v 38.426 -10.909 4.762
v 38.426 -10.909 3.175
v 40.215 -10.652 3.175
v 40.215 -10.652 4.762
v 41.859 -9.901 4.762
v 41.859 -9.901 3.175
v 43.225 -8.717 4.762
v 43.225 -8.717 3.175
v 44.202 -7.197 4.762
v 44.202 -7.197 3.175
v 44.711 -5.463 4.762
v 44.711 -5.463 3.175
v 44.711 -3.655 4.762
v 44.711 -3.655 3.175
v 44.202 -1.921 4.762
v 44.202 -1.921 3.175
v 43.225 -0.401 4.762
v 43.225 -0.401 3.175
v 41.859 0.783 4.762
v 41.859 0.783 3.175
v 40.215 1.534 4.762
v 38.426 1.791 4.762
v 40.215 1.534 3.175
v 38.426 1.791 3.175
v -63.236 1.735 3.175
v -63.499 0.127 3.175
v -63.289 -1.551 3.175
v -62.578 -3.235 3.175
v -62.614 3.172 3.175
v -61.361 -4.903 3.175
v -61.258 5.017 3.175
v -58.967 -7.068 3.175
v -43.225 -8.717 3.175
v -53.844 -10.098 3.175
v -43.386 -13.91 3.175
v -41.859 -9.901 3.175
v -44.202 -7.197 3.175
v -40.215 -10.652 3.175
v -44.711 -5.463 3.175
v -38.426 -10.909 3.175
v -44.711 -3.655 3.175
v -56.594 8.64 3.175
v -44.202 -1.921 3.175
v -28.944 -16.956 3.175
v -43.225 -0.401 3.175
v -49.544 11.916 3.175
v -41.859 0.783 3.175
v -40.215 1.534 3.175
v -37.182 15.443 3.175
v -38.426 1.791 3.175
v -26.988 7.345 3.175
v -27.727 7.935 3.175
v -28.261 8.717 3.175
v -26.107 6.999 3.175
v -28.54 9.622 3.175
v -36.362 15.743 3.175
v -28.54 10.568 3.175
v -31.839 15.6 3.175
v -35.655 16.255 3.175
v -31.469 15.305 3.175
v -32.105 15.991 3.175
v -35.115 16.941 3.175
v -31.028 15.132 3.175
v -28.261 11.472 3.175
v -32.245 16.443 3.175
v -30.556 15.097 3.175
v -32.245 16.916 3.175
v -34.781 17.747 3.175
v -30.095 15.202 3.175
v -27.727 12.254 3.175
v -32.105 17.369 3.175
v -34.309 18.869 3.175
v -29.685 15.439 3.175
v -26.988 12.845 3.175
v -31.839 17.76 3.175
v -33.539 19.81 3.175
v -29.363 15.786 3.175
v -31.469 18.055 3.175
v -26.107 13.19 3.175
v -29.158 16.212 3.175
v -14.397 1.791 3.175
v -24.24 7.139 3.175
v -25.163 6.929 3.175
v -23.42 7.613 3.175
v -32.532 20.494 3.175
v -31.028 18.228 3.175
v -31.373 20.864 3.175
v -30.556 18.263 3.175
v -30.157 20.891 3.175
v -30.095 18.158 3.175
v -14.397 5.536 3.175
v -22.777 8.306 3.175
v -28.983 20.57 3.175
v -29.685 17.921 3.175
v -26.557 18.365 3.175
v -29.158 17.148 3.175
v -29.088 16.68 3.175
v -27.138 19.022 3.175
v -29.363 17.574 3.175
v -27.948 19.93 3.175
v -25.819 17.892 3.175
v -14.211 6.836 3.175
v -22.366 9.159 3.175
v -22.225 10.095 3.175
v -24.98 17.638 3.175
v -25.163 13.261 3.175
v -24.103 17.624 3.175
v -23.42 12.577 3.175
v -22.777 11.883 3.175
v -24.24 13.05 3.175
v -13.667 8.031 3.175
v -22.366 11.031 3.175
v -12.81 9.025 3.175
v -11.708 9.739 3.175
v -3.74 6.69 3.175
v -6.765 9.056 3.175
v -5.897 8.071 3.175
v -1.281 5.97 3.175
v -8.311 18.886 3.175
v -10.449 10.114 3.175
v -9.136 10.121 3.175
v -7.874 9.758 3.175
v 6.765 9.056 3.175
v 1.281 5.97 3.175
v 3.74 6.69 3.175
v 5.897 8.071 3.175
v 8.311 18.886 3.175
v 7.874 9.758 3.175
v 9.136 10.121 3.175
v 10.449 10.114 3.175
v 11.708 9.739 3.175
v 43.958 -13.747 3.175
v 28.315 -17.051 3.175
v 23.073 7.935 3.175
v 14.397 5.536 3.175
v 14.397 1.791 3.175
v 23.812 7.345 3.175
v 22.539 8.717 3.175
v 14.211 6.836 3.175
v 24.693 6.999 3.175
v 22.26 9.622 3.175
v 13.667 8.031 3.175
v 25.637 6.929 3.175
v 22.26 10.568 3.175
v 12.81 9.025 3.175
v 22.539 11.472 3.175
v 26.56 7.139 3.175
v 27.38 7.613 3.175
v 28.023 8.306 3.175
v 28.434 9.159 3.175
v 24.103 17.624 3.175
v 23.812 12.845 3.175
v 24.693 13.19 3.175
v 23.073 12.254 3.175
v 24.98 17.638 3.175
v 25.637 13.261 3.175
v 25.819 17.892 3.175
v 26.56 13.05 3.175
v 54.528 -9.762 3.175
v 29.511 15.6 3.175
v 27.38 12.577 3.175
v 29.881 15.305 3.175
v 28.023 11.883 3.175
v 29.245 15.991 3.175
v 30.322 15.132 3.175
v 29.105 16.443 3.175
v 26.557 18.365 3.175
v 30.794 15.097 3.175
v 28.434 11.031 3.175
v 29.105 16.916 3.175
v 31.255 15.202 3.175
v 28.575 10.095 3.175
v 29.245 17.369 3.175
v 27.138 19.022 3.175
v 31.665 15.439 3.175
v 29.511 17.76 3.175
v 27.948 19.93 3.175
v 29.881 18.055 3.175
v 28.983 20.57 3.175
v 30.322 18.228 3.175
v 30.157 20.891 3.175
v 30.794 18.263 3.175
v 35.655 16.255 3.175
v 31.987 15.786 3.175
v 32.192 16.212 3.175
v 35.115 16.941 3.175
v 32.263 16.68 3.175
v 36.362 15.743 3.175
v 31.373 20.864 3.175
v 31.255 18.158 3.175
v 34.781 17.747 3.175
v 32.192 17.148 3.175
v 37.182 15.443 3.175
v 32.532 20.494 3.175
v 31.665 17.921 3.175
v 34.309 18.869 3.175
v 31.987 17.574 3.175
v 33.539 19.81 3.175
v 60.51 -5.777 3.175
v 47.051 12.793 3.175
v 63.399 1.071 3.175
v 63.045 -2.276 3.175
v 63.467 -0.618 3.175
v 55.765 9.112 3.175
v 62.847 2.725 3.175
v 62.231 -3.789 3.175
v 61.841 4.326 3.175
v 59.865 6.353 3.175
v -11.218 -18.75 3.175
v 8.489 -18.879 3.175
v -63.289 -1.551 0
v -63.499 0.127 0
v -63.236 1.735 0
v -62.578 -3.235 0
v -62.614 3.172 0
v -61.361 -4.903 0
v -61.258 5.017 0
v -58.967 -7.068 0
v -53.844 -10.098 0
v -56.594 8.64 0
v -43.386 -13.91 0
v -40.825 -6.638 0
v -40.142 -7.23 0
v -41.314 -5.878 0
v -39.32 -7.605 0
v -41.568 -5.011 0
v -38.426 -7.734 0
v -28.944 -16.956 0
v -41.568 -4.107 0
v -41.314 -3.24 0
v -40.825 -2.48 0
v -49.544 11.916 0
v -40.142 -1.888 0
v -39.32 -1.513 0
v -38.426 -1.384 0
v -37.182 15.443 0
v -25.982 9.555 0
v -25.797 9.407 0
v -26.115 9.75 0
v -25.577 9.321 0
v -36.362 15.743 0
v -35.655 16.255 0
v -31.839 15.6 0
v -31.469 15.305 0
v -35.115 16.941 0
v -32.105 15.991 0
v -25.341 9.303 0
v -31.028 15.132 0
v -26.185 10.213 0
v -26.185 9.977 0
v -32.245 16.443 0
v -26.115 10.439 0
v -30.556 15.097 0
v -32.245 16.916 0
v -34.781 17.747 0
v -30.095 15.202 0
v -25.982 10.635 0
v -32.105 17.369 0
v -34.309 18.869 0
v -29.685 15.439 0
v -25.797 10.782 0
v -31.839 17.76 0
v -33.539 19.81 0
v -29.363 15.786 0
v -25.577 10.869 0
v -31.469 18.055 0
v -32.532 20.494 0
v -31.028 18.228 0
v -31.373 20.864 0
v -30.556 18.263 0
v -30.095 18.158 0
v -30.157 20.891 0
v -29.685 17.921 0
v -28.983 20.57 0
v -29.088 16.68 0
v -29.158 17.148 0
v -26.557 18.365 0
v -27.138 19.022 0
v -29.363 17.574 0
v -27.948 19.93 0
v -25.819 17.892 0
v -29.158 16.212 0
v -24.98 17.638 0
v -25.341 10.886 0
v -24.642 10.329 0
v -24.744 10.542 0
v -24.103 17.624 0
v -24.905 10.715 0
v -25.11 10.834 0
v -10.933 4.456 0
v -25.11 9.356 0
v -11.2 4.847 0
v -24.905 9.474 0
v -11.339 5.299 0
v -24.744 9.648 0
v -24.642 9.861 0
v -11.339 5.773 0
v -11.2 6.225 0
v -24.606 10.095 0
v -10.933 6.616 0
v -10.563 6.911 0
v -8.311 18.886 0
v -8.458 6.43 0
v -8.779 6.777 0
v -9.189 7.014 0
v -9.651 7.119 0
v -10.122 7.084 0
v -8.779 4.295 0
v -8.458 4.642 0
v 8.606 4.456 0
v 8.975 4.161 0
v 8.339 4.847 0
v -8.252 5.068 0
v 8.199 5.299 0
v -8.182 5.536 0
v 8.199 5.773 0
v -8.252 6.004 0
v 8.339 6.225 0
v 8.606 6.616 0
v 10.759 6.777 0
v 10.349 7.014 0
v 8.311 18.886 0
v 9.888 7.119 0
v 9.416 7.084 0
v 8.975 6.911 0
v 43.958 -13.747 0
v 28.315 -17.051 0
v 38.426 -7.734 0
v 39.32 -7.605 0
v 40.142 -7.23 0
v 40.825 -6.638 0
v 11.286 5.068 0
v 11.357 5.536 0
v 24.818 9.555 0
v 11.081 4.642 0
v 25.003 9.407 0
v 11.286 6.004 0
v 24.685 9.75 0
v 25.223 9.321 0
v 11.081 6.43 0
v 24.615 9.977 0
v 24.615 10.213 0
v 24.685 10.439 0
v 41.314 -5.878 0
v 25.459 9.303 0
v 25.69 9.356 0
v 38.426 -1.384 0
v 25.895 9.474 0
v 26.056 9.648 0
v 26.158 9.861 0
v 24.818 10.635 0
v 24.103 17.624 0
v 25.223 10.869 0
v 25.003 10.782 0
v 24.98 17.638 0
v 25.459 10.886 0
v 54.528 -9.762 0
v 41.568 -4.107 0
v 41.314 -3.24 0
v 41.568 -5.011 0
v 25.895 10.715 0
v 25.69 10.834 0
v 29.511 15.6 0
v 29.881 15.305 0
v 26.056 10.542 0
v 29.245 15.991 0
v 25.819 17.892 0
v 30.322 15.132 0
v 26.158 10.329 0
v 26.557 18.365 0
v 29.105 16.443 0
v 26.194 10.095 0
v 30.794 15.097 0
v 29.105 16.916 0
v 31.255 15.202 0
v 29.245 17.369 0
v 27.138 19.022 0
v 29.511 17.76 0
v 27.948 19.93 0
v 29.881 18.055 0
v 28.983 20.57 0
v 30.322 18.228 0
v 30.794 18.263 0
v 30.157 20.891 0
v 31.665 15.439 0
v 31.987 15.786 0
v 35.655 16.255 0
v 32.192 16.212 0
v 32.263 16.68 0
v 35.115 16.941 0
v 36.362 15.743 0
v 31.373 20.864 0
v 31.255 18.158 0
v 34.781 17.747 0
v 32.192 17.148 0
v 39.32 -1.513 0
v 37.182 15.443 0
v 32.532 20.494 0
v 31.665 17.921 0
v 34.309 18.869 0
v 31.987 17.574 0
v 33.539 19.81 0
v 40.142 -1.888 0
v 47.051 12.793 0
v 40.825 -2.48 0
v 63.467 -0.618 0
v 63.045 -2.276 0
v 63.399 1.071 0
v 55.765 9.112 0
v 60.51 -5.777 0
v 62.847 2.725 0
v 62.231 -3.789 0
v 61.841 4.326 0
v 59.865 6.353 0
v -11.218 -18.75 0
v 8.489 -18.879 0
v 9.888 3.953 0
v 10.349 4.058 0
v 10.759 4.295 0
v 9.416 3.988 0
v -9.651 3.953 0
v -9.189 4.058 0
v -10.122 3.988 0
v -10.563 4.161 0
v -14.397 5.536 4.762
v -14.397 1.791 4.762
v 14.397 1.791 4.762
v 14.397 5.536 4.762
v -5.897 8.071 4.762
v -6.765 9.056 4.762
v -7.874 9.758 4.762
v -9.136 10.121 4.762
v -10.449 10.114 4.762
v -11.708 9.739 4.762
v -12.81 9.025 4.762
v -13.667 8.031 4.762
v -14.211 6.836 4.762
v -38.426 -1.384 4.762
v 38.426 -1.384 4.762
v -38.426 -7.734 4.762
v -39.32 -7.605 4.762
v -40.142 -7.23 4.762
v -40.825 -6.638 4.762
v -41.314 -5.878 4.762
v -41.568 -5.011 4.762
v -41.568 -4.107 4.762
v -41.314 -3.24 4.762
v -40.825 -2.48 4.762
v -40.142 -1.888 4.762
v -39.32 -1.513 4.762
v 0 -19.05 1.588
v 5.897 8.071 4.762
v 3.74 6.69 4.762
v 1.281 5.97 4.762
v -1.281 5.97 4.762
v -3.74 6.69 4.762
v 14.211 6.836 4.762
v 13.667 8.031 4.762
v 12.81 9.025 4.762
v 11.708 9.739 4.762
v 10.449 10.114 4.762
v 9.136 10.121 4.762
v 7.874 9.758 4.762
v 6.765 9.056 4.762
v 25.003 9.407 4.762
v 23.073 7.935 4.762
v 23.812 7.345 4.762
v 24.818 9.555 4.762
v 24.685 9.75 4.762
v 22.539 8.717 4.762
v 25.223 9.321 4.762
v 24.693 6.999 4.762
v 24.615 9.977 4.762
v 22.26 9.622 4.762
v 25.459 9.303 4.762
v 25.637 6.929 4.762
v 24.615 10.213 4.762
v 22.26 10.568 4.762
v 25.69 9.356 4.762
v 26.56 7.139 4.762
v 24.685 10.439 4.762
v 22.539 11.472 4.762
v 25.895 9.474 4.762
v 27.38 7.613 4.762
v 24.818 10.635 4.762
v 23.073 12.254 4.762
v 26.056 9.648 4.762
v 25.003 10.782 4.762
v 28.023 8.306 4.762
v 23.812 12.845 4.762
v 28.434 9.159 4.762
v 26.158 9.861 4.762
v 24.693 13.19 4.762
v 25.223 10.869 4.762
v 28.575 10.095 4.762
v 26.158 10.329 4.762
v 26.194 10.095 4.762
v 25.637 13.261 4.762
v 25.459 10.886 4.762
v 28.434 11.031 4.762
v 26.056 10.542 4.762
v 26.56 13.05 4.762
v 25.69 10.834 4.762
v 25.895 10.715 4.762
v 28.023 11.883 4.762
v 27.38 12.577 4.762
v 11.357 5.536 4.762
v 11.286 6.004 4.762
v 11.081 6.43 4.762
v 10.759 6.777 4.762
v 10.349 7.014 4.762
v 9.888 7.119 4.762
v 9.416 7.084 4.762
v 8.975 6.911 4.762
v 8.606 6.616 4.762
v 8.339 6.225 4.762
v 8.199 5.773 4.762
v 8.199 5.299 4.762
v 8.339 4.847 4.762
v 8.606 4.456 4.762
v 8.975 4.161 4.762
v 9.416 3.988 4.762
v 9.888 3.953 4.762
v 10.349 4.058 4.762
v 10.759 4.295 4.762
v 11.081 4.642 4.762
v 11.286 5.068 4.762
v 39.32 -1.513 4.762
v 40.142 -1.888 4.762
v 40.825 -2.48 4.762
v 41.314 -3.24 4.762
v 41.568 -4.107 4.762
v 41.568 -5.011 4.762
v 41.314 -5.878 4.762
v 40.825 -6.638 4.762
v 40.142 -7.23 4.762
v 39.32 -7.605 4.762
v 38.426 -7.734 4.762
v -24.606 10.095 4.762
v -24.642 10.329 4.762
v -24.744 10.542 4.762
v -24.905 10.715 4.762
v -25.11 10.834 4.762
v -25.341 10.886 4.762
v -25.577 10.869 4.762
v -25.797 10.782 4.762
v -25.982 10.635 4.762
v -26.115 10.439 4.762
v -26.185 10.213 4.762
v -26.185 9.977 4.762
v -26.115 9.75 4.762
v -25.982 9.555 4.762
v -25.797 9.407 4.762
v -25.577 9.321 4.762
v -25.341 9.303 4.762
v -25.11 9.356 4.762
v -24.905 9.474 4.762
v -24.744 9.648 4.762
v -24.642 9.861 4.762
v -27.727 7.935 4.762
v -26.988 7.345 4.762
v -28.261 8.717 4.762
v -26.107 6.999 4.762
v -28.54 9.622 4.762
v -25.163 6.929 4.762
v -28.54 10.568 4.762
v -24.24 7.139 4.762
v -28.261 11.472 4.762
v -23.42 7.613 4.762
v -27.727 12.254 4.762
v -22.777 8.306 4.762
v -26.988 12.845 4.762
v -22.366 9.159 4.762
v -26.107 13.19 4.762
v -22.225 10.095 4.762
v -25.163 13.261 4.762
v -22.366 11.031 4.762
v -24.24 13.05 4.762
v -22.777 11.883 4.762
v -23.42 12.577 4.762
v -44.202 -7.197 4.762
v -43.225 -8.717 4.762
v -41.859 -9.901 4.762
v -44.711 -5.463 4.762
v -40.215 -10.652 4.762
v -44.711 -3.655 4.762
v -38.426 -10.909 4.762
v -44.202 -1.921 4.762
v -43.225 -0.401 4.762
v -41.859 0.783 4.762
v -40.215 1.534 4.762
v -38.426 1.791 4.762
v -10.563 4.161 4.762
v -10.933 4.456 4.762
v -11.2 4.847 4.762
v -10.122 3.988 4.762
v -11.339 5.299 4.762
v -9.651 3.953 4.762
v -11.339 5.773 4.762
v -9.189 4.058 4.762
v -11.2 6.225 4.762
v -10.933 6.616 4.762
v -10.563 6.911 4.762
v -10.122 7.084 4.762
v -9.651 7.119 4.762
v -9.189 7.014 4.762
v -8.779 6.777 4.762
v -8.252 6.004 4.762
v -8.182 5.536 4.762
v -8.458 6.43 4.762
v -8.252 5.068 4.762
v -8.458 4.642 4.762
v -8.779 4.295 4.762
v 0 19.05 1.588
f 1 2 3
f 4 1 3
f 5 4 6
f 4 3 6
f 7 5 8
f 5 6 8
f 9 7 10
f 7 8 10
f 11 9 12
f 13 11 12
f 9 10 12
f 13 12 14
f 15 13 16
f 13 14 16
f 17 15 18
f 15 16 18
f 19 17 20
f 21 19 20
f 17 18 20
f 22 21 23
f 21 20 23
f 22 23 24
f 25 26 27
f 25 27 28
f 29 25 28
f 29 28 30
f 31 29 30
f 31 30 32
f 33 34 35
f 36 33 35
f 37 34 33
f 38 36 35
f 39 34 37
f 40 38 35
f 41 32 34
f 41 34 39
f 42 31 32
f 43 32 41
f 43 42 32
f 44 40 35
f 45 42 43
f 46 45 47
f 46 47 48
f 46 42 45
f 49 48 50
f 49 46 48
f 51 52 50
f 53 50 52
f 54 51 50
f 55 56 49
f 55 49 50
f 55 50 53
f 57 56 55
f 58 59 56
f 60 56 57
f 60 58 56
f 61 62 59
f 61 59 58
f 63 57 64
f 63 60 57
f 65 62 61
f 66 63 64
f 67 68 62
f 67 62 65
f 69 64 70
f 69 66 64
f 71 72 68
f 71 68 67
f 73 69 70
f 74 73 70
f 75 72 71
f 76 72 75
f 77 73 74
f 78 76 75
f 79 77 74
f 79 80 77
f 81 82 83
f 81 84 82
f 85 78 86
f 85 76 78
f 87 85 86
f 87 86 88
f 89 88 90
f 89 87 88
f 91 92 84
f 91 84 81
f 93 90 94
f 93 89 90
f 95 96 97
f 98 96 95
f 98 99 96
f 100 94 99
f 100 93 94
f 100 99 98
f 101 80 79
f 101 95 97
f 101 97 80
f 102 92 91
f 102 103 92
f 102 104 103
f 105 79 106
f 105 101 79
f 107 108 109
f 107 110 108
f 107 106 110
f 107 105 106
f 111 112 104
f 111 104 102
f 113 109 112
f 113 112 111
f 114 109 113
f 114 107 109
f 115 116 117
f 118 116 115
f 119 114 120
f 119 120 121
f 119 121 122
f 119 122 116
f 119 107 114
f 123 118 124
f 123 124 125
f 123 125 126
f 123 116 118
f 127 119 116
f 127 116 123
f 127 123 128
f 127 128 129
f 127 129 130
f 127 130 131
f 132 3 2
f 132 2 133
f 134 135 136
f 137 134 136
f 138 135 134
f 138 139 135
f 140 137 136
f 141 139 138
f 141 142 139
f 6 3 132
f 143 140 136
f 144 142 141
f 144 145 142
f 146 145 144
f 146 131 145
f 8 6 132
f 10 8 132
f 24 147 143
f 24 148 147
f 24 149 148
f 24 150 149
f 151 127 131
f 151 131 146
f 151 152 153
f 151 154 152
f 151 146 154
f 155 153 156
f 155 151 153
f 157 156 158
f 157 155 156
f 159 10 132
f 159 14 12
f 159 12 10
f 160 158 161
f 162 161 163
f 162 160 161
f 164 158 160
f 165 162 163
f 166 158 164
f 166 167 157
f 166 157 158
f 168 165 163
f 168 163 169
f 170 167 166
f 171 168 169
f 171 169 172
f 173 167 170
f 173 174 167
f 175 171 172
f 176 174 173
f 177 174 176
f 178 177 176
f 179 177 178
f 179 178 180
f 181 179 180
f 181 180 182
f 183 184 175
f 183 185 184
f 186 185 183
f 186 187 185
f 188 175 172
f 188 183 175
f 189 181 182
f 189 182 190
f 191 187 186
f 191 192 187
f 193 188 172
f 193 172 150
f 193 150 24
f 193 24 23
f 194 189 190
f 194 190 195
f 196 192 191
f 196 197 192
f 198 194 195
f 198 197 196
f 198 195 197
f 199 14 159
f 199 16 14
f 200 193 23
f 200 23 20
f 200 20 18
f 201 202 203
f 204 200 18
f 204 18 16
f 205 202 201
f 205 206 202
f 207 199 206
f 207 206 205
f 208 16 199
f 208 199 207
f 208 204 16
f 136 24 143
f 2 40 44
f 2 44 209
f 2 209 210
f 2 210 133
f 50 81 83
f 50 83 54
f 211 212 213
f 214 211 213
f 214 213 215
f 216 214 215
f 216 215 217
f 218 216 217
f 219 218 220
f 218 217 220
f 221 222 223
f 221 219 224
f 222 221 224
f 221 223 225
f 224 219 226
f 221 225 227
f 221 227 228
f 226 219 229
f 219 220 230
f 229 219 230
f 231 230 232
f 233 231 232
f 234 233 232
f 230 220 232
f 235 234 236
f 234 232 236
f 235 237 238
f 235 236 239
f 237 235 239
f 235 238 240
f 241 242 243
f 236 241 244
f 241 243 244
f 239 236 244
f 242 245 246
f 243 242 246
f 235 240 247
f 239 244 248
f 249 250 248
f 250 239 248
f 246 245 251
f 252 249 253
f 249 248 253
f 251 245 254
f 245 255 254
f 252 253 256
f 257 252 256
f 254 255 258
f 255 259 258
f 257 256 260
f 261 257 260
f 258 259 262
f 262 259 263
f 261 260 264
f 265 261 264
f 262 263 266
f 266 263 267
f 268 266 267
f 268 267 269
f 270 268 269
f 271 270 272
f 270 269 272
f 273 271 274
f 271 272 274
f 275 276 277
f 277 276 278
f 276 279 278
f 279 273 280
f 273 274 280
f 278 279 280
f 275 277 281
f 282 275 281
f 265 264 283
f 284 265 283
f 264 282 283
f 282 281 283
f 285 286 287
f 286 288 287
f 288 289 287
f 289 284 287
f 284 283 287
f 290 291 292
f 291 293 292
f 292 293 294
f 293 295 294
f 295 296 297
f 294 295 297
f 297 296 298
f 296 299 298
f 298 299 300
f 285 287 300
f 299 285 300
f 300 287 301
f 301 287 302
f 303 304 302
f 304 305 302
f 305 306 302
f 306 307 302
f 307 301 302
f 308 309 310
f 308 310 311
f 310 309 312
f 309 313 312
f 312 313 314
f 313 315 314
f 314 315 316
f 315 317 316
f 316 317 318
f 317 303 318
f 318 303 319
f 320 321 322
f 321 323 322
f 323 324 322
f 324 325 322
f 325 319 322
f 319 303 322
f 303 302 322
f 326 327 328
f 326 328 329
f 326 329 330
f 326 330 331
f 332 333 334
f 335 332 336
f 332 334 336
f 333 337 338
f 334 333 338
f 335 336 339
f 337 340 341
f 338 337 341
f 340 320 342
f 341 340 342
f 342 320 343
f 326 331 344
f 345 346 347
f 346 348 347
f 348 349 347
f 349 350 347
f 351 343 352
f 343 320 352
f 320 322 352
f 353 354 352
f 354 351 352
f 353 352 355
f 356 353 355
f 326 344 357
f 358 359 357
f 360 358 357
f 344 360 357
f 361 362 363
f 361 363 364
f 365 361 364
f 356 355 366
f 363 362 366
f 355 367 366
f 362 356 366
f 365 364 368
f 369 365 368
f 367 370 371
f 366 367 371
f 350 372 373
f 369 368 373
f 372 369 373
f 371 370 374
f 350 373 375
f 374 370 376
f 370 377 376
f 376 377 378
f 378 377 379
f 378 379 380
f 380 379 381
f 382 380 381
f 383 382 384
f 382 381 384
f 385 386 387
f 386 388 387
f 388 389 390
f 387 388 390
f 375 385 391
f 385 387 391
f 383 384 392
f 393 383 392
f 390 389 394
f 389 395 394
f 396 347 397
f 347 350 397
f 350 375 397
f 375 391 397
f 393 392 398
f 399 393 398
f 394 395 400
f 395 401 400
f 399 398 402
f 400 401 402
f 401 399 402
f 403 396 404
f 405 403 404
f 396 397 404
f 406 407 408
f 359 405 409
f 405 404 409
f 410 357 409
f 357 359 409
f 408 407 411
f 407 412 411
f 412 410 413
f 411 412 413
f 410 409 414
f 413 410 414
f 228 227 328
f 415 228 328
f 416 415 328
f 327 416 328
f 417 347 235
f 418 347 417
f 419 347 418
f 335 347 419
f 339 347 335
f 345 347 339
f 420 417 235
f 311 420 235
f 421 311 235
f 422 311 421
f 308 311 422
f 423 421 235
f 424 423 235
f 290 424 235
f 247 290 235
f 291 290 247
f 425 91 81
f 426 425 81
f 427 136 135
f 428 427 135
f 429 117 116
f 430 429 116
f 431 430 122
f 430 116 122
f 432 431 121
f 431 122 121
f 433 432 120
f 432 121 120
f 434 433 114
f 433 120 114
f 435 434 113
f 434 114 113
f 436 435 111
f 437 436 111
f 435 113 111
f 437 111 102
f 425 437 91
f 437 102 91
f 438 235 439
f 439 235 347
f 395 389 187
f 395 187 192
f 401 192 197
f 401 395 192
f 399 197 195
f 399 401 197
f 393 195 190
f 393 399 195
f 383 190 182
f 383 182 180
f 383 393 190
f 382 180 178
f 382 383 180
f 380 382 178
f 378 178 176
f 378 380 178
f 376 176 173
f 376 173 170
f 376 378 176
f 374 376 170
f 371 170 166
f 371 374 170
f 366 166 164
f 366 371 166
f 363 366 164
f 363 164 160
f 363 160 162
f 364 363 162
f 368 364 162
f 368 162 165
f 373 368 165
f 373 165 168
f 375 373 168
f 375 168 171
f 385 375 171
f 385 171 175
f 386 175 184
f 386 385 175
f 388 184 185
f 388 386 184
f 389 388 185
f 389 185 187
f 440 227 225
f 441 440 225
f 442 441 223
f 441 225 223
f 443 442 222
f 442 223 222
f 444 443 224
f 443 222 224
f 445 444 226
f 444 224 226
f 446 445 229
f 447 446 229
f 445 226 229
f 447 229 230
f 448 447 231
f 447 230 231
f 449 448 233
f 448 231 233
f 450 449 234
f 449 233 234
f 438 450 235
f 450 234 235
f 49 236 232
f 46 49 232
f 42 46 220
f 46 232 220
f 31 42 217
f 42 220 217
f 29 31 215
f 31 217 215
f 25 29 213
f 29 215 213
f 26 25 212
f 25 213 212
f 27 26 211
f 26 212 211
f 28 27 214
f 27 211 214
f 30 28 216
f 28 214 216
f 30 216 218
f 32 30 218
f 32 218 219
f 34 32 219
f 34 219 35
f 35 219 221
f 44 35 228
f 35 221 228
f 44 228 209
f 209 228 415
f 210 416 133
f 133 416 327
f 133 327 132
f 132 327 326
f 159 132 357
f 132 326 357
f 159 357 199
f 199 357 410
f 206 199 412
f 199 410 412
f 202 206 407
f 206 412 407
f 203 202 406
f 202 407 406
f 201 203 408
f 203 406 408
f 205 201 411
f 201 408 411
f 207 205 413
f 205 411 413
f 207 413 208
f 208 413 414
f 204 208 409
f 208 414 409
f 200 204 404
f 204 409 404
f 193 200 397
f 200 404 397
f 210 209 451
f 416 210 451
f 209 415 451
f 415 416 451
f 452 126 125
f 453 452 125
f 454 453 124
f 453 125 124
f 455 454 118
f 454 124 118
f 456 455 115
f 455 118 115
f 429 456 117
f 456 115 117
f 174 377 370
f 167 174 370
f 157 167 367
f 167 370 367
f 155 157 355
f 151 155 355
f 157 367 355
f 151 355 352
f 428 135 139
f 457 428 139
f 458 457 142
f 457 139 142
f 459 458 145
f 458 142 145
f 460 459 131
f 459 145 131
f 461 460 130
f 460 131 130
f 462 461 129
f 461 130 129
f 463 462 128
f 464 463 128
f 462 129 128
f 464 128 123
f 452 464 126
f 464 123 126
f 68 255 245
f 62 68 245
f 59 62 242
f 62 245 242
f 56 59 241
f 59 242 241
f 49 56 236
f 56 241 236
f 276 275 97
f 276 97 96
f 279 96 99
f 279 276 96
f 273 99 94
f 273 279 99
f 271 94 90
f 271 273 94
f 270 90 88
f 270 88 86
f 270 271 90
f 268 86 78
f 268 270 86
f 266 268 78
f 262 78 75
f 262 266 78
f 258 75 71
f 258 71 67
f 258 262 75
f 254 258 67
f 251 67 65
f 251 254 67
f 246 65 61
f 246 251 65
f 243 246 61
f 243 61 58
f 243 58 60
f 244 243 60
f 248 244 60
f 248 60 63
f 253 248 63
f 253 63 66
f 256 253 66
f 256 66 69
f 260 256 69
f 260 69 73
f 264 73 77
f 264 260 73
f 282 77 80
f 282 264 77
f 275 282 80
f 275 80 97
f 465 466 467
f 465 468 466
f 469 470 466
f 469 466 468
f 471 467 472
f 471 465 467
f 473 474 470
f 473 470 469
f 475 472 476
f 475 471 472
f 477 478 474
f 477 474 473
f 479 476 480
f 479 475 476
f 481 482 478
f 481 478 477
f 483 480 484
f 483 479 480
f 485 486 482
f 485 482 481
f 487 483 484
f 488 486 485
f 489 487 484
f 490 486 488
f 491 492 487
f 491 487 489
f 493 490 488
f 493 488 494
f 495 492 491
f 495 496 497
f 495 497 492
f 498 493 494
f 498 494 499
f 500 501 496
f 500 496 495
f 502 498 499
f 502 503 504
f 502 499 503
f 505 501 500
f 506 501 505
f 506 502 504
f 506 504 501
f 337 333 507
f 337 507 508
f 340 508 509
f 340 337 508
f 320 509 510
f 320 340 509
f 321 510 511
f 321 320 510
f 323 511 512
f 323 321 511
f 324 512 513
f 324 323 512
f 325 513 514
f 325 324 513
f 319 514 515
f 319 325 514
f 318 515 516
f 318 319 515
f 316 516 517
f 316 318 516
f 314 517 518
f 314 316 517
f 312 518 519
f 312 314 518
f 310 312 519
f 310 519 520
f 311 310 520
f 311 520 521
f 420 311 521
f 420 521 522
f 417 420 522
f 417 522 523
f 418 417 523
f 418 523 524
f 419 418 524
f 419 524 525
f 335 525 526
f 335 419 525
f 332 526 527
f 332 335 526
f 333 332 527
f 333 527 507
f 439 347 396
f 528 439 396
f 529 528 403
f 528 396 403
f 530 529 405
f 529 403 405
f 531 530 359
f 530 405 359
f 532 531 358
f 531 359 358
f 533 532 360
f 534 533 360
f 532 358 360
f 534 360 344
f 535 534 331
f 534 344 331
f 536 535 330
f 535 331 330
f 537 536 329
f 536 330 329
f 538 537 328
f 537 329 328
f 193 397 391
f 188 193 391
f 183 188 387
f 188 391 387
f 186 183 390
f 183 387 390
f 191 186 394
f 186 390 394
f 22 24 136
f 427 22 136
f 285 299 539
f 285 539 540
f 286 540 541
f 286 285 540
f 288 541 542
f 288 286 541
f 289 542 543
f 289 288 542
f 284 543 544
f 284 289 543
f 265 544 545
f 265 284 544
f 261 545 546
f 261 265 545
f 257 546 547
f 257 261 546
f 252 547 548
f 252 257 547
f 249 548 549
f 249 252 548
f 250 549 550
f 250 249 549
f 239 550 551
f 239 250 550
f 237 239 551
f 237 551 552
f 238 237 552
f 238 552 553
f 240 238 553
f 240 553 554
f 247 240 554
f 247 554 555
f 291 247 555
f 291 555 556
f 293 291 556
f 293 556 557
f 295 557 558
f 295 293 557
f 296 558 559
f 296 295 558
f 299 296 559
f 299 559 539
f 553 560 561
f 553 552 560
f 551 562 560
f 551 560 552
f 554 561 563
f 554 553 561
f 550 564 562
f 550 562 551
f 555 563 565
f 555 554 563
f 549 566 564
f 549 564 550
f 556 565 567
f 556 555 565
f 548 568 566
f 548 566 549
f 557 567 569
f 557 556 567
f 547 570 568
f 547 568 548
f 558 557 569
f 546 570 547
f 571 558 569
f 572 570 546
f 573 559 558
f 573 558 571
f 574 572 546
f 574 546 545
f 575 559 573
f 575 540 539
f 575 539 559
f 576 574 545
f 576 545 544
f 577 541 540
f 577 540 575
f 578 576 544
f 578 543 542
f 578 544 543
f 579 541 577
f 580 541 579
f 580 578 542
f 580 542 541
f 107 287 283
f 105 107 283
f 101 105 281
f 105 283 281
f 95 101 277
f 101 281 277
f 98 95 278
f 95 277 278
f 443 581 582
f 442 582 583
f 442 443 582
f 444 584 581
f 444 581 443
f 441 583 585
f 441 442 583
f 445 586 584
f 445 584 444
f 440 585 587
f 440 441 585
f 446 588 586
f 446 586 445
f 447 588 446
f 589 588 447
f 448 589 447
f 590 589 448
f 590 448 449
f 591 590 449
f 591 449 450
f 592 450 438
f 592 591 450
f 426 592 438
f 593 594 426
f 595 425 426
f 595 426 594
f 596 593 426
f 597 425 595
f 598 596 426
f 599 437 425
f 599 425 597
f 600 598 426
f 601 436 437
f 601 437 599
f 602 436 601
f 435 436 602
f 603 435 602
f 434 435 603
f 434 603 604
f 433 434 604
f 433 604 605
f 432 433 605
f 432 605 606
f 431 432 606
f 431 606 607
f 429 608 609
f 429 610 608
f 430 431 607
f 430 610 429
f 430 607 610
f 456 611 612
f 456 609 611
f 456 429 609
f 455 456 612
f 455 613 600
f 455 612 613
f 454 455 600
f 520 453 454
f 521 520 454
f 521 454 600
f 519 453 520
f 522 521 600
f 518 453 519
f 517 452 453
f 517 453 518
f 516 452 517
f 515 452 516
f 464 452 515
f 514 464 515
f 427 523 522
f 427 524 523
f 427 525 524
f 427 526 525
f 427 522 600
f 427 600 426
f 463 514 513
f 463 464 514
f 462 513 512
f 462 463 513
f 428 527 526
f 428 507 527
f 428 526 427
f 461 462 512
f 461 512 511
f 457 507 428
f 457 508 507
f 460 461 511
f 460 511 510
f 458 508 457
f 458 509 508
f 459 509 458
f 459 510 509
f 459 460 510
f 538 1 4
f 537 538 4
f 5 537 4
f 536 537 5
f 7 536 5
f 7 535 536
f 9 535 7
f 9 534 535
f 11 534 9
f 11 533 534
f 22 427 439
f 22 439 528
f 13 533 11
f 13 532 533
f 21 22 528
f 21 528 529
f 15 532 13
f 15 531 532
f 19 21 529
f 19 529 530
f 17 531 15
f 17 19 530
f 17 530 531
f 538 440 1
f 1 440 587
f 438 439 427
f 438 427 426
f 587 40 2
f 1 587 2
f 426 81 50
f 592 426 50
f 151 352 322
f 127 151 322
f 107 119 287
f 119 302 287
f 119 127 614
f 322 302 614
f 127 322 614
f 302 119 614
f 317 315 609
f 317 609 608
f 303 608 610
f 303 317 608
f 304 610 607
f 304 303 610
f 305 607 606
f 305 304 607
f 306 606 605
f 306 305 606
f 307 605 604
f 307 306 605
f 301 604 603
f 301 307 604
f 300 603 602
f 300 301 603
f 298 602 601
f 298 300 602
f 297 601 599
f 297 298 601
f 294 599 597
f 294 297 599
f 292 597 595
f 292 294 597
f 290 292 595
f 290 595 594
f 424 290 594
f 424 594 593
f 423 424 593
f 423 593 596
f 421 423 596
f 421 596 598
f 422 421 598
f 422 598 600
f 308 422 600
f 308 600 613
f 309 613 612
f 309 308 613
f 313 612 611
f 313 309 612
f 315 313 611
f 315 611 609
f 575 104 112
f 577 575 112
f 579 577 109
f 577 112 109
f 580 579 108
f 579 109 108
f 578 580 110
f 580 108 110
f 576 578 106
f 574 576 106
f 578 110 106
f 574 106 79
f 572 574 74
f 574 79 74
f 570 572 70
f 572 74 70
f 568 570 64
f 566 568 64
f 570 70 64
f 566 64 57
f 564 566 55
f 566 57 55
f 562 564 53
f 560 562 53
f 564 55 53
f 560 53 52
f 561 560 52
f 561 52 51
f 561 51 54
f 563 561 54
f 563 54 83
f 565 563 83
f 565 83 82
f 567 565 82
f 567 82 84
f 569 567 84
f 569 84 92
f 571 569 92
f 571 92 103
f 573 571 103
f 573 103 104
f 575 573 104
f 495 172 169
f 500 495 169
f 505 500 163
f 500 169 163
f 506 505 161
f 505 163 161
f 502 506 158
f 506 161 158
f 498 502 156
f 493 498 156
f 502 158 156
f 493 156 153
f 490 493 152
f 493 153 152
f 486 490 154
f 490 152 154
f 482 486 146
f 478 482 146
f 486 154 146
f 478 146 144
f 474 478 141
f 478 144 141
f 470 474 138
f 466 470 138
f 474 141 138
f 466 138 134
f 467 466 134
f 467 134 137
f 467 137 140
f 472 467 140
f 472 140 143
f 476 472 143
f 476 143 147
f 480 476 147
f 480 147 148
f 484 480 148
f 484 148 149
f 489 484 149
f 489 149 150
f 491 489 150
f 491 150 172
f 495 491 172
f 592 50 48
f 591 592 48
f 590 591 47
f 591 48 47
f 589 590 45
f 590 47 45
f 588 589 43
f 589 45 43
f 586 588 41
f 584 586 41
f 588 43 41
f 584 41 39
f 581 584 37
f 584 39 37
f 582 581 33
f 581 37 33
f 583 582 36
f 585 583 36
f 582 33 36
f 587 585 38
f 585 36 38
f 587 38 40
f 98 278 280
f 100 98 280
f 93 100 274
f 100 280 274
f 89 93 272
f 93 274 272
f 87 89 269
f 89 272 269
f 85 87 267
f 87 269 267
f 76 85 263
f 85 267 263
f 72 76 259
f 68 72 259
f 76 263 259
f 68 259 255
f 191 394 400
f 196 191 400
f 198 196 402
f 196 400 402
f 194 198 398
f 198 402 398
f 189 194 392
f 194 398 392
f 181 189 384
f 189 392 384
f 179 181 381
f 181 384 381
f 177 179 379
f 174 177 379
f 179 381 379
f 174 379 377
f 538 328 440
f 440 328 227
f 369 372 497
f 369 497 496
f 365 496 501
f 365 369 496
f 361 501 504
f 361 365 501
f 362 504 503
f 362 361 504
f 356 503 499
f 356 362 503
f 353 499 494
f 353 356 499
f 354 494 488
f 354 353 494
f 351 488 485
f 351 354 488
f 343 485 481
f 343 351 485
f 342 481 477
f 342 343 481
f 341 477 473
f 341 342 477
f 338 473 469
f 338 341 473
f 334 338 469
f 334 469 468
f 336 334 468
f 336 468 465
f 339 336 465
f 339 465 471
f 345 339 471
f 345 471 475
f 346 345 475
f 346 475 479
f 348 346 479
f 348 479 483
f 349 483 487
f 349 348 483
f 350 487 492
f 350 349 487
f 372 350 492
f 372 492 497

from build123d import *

# Parameters (mm, degrees)
F0_R     = 1.5875
F1_DEPTH = 4.7625
F0_R_2   = 3.175
F2_DEPTH = 3.175
F0_R_3   = 0.79375
F3_DEPTH = 4.7625


with BuildPart() as f1:
    # F0 (on Top) → F1 (new body)
    with BuildSketch(Plane.XY):
        with BuildLine():
            ThreePointArc((5.8970375136, 8.0709776401), (0, 5.8784868319), (-5.8970375136, 8.0709776401))
            ThreePointArc((-5.8970375136, 8.0709776401), (-11.0919363971, 9.9710945203), (-14.3974584471, 5.5359008893))
            Line((-14.3974584471, 5.5359008893), (-14.3974584471, 1.7910238821))
            Line((-14.3974584471, 1.7910238821), (-38.4256446949, 1.7910238821))
            ThreePointArc((-38.4256446949, 1.7910238821), (-44.775644668, -4.558976091), (-38.4256446949, -10.9089760641))
            Line((-38.4256446949, -10.9089760641), (38.4256446949, -10.9089760641))
            ThreePointArc((38.4256446949, -10.9089760641), (44.775644668, -4.558976091), (38.4256446949, 1.7910238821))
            Line((38.4256446949, 1.7910238821), (14.3974584471, 1.7910238821))
            Line((14.3974584471, 1.7910238821), (14.3974584471, 5.5359008893))
            ThreePointArc((14.3974584471, 5.5359008893), (11.0919363971, 9.9710945203), (5.8970375136, 8.0709776401))
        make_face()
        with BuildLine():
            ThreePointArc((-38.4256446949, -7.7339760641), (-41.6006446949, -4.5589760641), (-38.4256446949, -1.3839760641))
            Line((-38.4256446949, -1.3839760641), (38.4256446949, -1.3839760641))
            ThreePointArc((38.4256446949, -1.3839760641), (41.6006446949, -4.5589760641), (38.4256446949, -7.7339760641))
            Line((38.4256446949, -7.7339760641), (-38.4256446949, -7.7339760641))
        make_face(mode=Mode.SUBTRACT)
        with Locations((-9.769230575, 5.5359008893)):
            Circle(F0_R, mode=Mode.SUBTRACT)
        with Locations((9.769230575, 5.5359008893)):
            Circle(F0_R, mode=Mode.SUBTRACT)
    extrude(amount=F1_DEPTH)

    # F0 (on Top) → F2 (join)
    with BuildSketch(Plane.XY):
        with BuildLine():
            ThreePointArc((-24.1030436331, 17.6243126358), (-25.8193200805, 17.891793653), (-27.1380004421, 19.0223833409))
            ThreePointArc((-27.1380004421, 19.0223833409), (-31.3733022659, 20.8644178844), (-34.7810874927, 17.7470676241))
            ThreePointArc((-34.7810874927, 17.7470676241), (-35.6552985282, 16.2552803111), (-37.1815865182, 15.4428030538))
            add(Edge.make_bspline(
                [(-37.1815865182, 15.4428030538), (-196.360008544, -19.05), (0, -19.05), (196.360008544, -19.05), (37.1815865182, 15.4428030538)],
                knots=[5.3379310625, 5.3379310625, 5.3379310625, 7.853981634, 7.853981634, 10.3700322054, 10.3700322054, 10.3700322054], degree=2, weights=[1, 0.3076964173, 1, 0.3076964173, 1]))
            ThreePointArc((37.1815865182, 15.4428030538), (35.6552985282, 16.2552803111), (34.7810874927, 17.7470676241))
            ThreePointArc((34.7810874927, 17.7470676241), (31.3733022659, 20.8644178844), (27.1380004421, 19.0223833409))
            ThreePointArc((27.1380004421, 19.0223833409), (25.8193200805, 17.891793653), (24.1030436331, 17.6243126358))
            add(Edge.make_bspline(
                [(24.1030436331, 17.6243126358), (0, 20.5910158029), (-24.1030436331, 17.6243126358)],
                knots=[4.3230515768, 4.3230515768, 4.3230515768, 5.101726384, 5.101726384, 5.101726384], degree=2, weights=[1, 0.9251607683, 1]))
        make_face()
        with BuildLine():
            ThreePointArc((-14.3974584471, 5.5359008893), (-11.0919363971, 9.9710945203), (-5.8970375136, 8.0709776401))
            ThreePointArc((-5.8970375136, 8.0709776401), (0, 5.8784868319), (5.8970375136, 8.0709776401))
            ThreePointArc((5.8970375136, 8.0709776401), (11.0919363971, 9.9710945203), (14.3974584471, 5.5359008893))
            Line((14.3974584471, 5.5359008893), (14.3974584471, 1.7910238821))
            Line((14.3974584471, 1.7910238821), (38.4256446949, 1.7910238821))
            ThreePointArc((38.4256446949, 1.7910238821), (44.775644668, -4.558976091), (38.4256446949, -10.9089760641))
            Line((38.4256446949, -10.9089760641), (-38.4256446949, -10.9089760641))
            ThreePointArc((-38.4256446949, -10.9089760641), (-44.775644668, -4.558976091), (-38.4256446949, 1.7910238821))
            Line((-38.4256446949, 1.7910238821), (-14.3974584471, 1.7910238821))
            Line((-14.3974584471, 1.7910238821), (-14.3974584471, 5.5359008893))
        make_face(mode=Mode.SUBTRACT)
        with Locations((-25.4, 10.0948752699)):
            Circle(F0_R_2, mode=Mode.SUBTRACT)
        with Locations((-30.675064338, 16.6798123043)):
            Circle(F0_R, mode=Mode.SUBTRACT)
        with Locations((25.4, 10.0948752699)):
            Circle(F0_R_2, mode=Mode.SUBTRACT)
        with Locations((30.675064338, 16.6798123043)):
            Circle(F0_R, mode=Mode.SUBTRACT)
    extrude(amount=F2_DEPTH)

    # F0 (on Top) → F3 (join)
    with BuildSketch(Plane.XY):
        with Locations((-25.4, 10.0948752699)):
            Circle(F0_R_2)
        with Locations((-25.4, 10.0948752699)):
            Circle(F0_R_3, mode=Mode.SUBTRACT)
        with Locations((25.4, 10.0948752699)):
            Circle(F0_R_2)
        with Locations((25.4, 10.0948752699)):
            Circle(F0_R_3, mode=Mode.SUBTRACT)
    extrude(amount=F3_DEPTH)


solid = f1.part
